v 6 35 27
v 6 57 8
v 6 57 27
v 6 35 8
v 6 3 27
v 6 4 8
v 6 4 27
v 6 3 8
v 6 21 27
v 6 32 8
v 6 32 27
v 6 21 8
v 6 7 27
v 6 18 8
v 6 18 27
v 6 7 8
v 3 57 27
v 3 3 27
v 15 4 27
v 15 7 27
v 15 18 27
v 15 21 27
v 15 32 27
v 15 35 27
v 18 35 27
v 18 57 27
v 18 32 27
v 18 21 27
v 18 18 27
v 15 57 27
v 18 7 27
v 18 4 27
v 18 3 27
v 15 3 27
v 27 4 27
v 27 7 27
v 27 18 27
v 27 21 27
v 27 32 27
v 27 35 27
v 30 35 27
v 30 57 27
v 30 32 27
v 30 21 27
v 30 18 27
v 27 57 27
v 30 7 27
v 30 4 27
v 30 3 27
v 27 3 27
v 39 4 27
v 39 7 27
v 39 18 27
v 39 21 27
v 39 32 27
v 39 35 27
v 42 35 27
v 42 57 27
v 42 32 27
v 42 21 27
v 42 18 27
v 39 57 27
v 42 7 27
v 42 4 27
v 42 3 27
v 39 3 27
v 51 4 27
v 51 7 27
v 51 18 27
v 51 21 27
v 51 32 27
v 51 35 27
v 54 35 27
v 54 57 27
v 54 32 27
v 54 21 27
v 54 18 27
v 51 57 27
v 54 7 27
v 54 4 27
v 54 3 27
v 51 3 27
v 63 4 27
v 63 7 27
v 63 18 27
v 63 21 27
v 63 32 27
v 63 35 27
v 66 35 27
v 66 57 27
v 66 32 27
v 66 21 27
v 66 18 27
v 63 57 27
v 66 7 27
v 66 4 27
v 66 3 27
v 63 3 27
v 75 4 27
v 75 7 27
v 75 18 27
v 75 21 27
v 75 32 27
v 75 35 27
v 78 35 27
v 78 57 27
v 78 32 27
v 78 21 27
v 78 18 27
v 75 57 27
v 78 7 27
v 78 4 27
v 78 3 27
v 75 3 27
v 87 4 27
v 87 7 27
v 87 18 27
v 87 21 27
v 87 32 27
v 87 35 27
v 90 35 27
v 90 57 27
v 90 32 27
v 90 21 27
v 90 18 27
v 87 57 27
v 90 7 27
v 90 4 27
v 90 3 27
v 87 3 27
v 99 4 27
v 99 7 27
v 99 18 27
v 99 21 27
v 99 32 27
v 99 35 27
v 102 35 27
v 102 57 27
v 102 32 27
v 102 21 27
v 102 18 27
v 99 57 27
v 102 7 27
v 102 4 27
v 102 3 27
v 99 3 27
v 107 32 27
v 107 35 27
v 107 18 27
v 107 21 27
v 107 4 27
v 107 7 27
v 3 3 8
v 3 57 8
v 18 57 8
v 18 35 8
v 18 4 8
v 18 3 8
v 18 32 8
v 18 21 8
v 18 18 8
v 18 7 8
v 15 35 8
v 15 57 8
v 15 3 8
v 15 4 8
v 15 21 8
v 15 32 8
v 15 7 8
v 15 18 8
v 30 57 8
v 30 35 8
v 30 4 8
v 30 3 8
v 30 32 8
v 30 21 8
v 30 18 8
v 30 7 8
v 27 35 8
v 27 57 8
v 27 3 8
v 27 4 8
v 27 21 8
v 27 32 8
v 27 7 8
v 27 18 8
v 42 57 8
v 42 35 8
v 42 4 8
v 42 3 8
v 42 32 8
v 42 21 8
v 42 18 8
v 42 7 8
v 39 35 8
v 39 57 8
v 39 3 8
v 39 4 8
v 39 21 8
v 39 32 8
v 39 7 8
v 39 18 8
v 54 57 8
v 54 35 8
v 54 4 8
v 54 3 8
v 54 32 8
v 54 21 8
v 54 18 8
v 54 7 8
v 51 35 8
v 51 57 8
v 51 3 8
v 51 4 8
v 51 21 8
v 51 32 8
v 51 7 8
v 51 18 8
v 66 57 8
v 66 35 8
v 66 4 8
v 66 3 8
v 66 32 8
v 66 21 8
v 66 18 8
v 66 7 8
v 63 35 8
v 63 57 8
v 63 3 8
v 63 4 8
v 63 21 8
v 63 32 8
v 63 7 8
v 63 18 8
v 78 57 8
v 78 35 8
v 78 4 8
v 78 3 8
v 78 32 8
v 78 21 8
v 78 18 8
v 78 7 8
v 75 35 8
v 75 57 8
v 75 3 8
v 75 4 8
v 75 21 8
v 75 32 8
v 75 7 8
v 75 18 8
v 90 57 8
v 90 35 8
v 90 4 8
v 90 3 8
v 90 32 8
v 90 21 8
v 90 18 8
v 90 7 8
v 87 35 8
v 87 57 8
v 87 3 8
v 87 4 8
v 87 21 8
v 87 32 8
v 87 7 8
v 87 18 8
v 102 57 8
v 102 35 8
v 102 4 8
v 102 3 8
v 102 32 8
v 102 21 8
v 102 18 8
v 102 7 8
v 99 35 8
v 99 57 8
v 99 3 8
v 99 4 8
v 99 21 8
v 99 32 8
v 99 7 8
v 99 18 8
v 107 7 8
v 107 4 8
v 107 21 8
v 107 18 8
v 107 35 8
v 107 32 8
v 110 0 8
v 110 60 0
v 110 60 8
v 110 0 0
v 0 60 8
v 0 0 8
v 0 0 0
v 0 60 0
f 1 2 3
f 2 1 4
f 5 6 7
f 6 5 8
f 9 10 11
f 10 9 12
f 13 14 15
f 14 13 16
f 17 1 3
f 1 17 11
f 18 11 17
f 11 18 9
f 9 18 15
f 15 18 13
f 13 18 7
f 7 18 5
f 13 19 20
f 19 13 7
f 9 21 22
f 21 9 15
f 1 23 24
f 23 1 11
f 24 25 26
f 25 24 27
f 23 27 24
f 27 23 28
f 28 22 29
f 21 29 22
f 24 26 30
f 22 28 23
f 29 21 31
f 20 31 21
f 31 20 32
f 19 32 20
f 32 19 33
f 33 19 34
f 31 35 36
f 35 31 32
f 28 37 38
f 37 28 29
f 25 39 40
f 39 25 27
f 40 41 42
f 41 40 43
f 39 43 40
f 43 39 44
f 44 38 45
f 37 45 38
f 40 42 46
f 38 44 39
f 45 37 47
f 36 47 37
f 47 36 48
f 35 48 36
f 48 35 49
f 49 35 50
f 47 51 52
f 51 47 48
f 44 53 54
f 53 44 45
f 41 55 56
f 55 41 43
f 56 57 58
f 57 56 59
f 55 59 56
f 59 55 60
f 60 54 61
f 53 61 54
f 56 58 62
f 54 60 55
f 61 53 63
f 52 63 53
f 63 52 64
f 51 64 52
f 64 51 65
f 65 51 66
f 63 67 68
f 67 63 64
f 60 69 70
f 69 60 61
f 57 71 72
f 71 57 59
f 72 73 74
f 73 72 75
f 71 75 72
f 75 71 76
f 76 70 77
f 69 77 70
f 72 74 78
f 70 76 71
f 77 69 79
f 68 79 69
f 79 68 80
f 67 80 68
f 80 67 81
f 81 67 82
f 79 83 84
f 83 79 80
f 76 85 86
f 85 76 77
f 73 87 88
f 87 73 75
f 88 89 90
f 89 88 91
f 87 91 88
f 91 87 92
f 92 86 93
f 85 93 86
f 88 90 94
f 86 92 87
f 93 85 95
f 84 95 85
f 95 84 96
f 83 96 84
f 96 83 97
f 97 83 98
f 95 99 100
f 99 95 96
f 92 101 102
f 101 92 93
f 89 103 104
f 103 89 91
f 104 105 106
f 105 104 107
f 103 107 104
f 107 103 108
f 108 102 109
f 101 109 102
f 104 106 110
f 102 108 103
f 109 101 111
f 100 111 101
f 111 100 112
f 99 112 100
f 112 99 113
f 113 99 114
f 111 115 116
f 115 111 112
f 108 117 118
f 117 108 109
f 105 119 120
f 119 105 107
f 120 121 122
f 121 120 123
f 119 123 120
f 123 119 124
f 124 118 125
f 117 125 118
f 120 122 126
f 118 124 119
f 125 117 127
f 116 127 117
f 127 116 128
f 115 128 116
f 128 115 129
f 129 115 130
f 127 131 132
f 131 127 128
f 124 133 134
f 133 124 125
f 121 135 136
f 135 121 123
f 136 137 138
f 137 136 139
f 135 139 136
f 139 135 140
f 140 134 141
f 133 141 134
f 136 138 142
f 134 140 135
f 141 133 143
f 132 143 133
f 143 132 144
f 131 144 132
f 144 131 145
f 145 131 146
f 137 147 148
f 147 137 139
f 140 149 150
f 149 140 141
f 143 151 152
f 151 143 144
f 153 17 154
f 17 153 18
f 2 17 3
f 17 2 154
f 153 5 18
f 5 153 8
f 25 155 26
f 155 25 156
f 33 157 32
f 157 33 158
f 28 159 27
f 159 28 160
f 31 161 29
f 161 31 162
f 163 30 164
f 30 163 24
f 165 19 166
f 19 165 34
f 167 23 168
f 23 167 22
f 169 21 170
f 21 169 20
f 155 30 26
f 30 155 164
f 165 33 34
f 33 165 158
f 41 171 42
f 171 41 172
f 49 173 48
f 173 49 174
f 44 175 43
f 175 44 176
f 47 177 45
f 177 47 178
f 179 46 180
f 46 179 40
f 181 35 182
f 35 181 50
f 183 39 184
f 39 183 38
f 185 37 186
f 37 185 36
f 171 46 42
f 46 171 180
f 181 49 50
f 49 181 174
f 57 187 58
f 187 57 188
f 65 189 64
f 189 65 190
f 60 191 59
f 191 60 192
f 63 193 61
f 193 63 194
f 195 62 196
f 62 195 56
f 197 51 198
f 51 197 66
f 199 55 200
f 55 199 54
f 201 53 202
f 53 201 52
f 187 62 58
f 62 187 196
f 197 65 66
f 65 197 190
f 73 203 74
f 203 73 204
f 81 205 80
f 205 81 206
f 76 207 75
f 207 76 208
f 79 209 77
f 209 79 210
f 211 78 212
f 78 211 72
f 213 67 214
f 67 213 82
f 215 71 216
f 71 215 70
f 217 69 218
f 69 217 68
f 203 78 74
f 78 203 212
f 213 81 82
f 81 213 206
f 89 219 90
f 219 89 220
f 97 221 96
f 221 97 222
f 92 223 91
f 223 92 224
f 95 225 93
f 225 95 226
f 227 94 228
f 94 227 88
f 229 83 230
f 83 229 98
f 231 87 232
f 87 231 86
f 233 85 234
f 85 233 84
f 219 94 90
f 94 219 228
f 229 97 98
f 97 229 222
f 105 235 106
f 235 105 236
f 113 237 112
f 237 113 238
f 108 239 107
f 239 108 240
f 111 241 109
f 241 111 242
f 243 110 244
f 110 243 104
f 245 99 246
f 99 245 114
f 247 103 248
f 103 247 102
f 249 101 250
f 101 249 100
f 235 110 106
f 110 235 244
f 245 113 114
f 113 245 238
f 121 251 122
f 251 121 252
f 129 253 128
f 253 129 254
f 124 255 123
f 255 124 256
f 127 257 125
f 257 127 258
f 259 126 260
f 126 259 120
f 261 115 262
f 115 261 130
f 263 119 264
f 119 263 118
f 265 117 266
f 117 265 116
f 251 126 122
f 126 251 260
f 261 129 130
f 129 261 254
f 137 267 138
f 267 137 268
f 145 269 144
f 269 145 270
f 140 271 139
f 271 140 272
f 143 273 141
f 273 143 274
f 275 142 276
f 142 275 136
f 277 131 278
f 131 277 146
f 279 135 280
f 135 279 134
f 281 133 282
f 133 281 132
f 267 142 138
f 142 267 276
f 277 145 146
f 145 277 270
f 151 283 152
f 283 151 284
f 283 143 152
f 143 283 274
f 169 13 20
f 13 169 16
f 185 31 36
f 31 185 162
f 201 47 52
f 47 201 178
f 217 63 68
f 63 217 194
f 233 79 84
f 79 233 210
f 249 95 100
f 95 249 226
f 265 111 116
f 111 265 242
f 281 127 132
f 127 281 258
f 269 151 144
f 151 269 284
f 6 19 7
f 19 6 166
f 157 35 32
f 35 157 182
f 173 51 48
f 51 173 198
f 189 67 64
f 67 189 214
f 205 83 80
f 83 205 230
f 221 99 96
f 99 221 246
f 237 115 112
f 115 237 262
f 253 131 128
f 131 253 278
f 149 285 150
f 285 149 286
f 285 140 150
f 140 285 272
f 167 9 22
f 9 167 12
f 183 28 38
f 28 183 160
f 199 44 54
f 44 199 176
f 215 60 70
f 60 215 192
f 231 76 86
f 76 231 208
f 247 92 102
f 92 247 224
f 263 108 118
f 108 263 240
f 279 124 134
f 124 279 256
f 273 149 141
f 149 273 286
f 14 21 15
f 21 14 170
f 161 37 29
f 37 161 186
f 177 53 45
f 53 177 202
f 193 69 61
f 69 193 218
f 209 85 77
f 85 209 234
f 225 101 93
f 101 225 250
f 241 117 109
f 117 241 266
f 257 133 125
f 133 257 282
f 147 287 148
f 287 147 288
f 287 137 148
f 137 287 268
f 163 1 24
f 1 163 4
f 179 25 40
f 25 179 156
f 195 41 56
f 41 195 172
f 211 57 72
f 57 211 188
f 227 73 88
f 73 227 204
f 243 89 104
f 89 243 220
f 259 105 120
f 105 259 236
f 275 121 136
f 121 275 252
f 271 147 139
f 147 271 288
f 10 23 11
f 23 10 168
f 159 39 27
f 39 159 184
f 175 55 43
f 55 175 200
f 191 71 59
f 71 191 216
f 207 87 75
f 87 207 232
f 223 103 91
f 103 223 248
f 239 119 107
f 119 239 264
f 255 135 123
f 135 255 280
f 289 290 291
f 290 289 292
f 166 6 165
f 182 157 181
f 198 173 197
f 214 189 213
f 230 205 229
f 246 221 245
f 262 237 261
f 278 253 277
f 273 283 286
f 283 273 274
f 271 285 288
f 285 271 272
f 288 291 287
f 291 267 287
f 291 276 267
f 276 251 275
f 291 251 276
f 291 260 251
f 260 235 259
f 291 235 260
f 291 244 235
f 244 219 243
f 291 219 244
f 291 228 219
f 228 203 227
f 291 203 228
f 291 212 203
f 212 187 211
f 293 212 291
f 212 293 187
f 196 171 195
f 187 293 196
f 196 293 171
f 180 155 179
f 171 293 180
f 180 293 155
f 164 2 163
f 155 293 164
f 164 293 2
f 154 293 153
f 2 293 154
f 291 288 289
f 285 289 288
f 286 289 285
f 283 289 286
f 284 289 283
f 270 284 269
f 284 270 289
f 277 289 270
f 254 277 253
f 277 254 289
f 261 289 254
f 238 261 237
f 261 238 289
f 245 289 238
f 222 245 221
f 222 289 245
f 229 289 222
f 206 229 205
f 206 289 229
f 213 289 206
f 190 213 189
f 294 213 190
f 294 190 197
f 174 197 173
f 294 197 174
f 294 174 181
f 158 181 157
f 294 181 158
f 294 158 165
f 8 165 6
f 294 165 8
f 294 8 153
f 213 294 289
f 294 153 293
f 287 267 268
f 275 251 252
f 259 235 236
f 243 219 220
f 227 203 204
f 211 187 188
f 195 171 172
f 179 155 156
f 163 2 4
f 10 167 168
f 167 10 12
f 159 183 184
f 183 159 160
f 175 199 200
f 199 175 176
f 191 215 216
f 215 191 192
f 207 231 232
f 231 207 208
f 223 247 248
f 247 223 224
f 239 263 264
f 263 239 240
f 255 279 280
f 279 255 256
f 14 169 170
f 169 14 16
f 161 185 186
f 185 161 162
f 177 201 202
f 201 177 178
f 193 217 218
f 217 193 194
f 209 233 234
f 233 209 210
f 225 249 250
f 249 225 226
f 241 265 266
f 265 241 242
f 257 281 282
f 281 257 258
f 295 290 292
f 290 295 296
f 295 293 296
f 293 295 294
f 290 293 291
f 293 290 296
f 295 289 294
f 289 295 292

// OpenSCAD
$fn = 32;

// ----------------------------------------------------------------------
// Heatsink: cross fin block
// ----------------------------------------------------------------------

// --- parameters (mm) ---
base_l = 110;             // base length, X
base_w = 60;              // base width, Y
base_t = 8;               // base plate thickness
fin_h = 20;               // fin height above the base
fin_t = 3;                // fin thickness
edge = 3;                 // margin from the base ends
pitch = 12;               // fin pitch
rib_pitch = 14;           // cross rib pitch

n_fins = floor((base_l - 2 * edge - fin_t) / pitch) + 1;  // fin count
total_h = base_t + fin_h - 1;  // overall height
n_ribs = floor((base_w - 2 * edge) / rib_pitch);  // rib count

union() {
  cube([base_l, base_w, base_t]);
  for (i = [0 : n_fins - 1])
    translate([edge + i * pitch, edge, base_t - 1])
      cube([fin_t, base_w - 2 * edge, fin_h]);
  for (i = [0 : n_ribs - 1])
    translate([edge, edge + 1 + i * rib_pitch, base_t - 1])
      cube([base_l - 2 * edge, fin_t, fin_h]);
}
